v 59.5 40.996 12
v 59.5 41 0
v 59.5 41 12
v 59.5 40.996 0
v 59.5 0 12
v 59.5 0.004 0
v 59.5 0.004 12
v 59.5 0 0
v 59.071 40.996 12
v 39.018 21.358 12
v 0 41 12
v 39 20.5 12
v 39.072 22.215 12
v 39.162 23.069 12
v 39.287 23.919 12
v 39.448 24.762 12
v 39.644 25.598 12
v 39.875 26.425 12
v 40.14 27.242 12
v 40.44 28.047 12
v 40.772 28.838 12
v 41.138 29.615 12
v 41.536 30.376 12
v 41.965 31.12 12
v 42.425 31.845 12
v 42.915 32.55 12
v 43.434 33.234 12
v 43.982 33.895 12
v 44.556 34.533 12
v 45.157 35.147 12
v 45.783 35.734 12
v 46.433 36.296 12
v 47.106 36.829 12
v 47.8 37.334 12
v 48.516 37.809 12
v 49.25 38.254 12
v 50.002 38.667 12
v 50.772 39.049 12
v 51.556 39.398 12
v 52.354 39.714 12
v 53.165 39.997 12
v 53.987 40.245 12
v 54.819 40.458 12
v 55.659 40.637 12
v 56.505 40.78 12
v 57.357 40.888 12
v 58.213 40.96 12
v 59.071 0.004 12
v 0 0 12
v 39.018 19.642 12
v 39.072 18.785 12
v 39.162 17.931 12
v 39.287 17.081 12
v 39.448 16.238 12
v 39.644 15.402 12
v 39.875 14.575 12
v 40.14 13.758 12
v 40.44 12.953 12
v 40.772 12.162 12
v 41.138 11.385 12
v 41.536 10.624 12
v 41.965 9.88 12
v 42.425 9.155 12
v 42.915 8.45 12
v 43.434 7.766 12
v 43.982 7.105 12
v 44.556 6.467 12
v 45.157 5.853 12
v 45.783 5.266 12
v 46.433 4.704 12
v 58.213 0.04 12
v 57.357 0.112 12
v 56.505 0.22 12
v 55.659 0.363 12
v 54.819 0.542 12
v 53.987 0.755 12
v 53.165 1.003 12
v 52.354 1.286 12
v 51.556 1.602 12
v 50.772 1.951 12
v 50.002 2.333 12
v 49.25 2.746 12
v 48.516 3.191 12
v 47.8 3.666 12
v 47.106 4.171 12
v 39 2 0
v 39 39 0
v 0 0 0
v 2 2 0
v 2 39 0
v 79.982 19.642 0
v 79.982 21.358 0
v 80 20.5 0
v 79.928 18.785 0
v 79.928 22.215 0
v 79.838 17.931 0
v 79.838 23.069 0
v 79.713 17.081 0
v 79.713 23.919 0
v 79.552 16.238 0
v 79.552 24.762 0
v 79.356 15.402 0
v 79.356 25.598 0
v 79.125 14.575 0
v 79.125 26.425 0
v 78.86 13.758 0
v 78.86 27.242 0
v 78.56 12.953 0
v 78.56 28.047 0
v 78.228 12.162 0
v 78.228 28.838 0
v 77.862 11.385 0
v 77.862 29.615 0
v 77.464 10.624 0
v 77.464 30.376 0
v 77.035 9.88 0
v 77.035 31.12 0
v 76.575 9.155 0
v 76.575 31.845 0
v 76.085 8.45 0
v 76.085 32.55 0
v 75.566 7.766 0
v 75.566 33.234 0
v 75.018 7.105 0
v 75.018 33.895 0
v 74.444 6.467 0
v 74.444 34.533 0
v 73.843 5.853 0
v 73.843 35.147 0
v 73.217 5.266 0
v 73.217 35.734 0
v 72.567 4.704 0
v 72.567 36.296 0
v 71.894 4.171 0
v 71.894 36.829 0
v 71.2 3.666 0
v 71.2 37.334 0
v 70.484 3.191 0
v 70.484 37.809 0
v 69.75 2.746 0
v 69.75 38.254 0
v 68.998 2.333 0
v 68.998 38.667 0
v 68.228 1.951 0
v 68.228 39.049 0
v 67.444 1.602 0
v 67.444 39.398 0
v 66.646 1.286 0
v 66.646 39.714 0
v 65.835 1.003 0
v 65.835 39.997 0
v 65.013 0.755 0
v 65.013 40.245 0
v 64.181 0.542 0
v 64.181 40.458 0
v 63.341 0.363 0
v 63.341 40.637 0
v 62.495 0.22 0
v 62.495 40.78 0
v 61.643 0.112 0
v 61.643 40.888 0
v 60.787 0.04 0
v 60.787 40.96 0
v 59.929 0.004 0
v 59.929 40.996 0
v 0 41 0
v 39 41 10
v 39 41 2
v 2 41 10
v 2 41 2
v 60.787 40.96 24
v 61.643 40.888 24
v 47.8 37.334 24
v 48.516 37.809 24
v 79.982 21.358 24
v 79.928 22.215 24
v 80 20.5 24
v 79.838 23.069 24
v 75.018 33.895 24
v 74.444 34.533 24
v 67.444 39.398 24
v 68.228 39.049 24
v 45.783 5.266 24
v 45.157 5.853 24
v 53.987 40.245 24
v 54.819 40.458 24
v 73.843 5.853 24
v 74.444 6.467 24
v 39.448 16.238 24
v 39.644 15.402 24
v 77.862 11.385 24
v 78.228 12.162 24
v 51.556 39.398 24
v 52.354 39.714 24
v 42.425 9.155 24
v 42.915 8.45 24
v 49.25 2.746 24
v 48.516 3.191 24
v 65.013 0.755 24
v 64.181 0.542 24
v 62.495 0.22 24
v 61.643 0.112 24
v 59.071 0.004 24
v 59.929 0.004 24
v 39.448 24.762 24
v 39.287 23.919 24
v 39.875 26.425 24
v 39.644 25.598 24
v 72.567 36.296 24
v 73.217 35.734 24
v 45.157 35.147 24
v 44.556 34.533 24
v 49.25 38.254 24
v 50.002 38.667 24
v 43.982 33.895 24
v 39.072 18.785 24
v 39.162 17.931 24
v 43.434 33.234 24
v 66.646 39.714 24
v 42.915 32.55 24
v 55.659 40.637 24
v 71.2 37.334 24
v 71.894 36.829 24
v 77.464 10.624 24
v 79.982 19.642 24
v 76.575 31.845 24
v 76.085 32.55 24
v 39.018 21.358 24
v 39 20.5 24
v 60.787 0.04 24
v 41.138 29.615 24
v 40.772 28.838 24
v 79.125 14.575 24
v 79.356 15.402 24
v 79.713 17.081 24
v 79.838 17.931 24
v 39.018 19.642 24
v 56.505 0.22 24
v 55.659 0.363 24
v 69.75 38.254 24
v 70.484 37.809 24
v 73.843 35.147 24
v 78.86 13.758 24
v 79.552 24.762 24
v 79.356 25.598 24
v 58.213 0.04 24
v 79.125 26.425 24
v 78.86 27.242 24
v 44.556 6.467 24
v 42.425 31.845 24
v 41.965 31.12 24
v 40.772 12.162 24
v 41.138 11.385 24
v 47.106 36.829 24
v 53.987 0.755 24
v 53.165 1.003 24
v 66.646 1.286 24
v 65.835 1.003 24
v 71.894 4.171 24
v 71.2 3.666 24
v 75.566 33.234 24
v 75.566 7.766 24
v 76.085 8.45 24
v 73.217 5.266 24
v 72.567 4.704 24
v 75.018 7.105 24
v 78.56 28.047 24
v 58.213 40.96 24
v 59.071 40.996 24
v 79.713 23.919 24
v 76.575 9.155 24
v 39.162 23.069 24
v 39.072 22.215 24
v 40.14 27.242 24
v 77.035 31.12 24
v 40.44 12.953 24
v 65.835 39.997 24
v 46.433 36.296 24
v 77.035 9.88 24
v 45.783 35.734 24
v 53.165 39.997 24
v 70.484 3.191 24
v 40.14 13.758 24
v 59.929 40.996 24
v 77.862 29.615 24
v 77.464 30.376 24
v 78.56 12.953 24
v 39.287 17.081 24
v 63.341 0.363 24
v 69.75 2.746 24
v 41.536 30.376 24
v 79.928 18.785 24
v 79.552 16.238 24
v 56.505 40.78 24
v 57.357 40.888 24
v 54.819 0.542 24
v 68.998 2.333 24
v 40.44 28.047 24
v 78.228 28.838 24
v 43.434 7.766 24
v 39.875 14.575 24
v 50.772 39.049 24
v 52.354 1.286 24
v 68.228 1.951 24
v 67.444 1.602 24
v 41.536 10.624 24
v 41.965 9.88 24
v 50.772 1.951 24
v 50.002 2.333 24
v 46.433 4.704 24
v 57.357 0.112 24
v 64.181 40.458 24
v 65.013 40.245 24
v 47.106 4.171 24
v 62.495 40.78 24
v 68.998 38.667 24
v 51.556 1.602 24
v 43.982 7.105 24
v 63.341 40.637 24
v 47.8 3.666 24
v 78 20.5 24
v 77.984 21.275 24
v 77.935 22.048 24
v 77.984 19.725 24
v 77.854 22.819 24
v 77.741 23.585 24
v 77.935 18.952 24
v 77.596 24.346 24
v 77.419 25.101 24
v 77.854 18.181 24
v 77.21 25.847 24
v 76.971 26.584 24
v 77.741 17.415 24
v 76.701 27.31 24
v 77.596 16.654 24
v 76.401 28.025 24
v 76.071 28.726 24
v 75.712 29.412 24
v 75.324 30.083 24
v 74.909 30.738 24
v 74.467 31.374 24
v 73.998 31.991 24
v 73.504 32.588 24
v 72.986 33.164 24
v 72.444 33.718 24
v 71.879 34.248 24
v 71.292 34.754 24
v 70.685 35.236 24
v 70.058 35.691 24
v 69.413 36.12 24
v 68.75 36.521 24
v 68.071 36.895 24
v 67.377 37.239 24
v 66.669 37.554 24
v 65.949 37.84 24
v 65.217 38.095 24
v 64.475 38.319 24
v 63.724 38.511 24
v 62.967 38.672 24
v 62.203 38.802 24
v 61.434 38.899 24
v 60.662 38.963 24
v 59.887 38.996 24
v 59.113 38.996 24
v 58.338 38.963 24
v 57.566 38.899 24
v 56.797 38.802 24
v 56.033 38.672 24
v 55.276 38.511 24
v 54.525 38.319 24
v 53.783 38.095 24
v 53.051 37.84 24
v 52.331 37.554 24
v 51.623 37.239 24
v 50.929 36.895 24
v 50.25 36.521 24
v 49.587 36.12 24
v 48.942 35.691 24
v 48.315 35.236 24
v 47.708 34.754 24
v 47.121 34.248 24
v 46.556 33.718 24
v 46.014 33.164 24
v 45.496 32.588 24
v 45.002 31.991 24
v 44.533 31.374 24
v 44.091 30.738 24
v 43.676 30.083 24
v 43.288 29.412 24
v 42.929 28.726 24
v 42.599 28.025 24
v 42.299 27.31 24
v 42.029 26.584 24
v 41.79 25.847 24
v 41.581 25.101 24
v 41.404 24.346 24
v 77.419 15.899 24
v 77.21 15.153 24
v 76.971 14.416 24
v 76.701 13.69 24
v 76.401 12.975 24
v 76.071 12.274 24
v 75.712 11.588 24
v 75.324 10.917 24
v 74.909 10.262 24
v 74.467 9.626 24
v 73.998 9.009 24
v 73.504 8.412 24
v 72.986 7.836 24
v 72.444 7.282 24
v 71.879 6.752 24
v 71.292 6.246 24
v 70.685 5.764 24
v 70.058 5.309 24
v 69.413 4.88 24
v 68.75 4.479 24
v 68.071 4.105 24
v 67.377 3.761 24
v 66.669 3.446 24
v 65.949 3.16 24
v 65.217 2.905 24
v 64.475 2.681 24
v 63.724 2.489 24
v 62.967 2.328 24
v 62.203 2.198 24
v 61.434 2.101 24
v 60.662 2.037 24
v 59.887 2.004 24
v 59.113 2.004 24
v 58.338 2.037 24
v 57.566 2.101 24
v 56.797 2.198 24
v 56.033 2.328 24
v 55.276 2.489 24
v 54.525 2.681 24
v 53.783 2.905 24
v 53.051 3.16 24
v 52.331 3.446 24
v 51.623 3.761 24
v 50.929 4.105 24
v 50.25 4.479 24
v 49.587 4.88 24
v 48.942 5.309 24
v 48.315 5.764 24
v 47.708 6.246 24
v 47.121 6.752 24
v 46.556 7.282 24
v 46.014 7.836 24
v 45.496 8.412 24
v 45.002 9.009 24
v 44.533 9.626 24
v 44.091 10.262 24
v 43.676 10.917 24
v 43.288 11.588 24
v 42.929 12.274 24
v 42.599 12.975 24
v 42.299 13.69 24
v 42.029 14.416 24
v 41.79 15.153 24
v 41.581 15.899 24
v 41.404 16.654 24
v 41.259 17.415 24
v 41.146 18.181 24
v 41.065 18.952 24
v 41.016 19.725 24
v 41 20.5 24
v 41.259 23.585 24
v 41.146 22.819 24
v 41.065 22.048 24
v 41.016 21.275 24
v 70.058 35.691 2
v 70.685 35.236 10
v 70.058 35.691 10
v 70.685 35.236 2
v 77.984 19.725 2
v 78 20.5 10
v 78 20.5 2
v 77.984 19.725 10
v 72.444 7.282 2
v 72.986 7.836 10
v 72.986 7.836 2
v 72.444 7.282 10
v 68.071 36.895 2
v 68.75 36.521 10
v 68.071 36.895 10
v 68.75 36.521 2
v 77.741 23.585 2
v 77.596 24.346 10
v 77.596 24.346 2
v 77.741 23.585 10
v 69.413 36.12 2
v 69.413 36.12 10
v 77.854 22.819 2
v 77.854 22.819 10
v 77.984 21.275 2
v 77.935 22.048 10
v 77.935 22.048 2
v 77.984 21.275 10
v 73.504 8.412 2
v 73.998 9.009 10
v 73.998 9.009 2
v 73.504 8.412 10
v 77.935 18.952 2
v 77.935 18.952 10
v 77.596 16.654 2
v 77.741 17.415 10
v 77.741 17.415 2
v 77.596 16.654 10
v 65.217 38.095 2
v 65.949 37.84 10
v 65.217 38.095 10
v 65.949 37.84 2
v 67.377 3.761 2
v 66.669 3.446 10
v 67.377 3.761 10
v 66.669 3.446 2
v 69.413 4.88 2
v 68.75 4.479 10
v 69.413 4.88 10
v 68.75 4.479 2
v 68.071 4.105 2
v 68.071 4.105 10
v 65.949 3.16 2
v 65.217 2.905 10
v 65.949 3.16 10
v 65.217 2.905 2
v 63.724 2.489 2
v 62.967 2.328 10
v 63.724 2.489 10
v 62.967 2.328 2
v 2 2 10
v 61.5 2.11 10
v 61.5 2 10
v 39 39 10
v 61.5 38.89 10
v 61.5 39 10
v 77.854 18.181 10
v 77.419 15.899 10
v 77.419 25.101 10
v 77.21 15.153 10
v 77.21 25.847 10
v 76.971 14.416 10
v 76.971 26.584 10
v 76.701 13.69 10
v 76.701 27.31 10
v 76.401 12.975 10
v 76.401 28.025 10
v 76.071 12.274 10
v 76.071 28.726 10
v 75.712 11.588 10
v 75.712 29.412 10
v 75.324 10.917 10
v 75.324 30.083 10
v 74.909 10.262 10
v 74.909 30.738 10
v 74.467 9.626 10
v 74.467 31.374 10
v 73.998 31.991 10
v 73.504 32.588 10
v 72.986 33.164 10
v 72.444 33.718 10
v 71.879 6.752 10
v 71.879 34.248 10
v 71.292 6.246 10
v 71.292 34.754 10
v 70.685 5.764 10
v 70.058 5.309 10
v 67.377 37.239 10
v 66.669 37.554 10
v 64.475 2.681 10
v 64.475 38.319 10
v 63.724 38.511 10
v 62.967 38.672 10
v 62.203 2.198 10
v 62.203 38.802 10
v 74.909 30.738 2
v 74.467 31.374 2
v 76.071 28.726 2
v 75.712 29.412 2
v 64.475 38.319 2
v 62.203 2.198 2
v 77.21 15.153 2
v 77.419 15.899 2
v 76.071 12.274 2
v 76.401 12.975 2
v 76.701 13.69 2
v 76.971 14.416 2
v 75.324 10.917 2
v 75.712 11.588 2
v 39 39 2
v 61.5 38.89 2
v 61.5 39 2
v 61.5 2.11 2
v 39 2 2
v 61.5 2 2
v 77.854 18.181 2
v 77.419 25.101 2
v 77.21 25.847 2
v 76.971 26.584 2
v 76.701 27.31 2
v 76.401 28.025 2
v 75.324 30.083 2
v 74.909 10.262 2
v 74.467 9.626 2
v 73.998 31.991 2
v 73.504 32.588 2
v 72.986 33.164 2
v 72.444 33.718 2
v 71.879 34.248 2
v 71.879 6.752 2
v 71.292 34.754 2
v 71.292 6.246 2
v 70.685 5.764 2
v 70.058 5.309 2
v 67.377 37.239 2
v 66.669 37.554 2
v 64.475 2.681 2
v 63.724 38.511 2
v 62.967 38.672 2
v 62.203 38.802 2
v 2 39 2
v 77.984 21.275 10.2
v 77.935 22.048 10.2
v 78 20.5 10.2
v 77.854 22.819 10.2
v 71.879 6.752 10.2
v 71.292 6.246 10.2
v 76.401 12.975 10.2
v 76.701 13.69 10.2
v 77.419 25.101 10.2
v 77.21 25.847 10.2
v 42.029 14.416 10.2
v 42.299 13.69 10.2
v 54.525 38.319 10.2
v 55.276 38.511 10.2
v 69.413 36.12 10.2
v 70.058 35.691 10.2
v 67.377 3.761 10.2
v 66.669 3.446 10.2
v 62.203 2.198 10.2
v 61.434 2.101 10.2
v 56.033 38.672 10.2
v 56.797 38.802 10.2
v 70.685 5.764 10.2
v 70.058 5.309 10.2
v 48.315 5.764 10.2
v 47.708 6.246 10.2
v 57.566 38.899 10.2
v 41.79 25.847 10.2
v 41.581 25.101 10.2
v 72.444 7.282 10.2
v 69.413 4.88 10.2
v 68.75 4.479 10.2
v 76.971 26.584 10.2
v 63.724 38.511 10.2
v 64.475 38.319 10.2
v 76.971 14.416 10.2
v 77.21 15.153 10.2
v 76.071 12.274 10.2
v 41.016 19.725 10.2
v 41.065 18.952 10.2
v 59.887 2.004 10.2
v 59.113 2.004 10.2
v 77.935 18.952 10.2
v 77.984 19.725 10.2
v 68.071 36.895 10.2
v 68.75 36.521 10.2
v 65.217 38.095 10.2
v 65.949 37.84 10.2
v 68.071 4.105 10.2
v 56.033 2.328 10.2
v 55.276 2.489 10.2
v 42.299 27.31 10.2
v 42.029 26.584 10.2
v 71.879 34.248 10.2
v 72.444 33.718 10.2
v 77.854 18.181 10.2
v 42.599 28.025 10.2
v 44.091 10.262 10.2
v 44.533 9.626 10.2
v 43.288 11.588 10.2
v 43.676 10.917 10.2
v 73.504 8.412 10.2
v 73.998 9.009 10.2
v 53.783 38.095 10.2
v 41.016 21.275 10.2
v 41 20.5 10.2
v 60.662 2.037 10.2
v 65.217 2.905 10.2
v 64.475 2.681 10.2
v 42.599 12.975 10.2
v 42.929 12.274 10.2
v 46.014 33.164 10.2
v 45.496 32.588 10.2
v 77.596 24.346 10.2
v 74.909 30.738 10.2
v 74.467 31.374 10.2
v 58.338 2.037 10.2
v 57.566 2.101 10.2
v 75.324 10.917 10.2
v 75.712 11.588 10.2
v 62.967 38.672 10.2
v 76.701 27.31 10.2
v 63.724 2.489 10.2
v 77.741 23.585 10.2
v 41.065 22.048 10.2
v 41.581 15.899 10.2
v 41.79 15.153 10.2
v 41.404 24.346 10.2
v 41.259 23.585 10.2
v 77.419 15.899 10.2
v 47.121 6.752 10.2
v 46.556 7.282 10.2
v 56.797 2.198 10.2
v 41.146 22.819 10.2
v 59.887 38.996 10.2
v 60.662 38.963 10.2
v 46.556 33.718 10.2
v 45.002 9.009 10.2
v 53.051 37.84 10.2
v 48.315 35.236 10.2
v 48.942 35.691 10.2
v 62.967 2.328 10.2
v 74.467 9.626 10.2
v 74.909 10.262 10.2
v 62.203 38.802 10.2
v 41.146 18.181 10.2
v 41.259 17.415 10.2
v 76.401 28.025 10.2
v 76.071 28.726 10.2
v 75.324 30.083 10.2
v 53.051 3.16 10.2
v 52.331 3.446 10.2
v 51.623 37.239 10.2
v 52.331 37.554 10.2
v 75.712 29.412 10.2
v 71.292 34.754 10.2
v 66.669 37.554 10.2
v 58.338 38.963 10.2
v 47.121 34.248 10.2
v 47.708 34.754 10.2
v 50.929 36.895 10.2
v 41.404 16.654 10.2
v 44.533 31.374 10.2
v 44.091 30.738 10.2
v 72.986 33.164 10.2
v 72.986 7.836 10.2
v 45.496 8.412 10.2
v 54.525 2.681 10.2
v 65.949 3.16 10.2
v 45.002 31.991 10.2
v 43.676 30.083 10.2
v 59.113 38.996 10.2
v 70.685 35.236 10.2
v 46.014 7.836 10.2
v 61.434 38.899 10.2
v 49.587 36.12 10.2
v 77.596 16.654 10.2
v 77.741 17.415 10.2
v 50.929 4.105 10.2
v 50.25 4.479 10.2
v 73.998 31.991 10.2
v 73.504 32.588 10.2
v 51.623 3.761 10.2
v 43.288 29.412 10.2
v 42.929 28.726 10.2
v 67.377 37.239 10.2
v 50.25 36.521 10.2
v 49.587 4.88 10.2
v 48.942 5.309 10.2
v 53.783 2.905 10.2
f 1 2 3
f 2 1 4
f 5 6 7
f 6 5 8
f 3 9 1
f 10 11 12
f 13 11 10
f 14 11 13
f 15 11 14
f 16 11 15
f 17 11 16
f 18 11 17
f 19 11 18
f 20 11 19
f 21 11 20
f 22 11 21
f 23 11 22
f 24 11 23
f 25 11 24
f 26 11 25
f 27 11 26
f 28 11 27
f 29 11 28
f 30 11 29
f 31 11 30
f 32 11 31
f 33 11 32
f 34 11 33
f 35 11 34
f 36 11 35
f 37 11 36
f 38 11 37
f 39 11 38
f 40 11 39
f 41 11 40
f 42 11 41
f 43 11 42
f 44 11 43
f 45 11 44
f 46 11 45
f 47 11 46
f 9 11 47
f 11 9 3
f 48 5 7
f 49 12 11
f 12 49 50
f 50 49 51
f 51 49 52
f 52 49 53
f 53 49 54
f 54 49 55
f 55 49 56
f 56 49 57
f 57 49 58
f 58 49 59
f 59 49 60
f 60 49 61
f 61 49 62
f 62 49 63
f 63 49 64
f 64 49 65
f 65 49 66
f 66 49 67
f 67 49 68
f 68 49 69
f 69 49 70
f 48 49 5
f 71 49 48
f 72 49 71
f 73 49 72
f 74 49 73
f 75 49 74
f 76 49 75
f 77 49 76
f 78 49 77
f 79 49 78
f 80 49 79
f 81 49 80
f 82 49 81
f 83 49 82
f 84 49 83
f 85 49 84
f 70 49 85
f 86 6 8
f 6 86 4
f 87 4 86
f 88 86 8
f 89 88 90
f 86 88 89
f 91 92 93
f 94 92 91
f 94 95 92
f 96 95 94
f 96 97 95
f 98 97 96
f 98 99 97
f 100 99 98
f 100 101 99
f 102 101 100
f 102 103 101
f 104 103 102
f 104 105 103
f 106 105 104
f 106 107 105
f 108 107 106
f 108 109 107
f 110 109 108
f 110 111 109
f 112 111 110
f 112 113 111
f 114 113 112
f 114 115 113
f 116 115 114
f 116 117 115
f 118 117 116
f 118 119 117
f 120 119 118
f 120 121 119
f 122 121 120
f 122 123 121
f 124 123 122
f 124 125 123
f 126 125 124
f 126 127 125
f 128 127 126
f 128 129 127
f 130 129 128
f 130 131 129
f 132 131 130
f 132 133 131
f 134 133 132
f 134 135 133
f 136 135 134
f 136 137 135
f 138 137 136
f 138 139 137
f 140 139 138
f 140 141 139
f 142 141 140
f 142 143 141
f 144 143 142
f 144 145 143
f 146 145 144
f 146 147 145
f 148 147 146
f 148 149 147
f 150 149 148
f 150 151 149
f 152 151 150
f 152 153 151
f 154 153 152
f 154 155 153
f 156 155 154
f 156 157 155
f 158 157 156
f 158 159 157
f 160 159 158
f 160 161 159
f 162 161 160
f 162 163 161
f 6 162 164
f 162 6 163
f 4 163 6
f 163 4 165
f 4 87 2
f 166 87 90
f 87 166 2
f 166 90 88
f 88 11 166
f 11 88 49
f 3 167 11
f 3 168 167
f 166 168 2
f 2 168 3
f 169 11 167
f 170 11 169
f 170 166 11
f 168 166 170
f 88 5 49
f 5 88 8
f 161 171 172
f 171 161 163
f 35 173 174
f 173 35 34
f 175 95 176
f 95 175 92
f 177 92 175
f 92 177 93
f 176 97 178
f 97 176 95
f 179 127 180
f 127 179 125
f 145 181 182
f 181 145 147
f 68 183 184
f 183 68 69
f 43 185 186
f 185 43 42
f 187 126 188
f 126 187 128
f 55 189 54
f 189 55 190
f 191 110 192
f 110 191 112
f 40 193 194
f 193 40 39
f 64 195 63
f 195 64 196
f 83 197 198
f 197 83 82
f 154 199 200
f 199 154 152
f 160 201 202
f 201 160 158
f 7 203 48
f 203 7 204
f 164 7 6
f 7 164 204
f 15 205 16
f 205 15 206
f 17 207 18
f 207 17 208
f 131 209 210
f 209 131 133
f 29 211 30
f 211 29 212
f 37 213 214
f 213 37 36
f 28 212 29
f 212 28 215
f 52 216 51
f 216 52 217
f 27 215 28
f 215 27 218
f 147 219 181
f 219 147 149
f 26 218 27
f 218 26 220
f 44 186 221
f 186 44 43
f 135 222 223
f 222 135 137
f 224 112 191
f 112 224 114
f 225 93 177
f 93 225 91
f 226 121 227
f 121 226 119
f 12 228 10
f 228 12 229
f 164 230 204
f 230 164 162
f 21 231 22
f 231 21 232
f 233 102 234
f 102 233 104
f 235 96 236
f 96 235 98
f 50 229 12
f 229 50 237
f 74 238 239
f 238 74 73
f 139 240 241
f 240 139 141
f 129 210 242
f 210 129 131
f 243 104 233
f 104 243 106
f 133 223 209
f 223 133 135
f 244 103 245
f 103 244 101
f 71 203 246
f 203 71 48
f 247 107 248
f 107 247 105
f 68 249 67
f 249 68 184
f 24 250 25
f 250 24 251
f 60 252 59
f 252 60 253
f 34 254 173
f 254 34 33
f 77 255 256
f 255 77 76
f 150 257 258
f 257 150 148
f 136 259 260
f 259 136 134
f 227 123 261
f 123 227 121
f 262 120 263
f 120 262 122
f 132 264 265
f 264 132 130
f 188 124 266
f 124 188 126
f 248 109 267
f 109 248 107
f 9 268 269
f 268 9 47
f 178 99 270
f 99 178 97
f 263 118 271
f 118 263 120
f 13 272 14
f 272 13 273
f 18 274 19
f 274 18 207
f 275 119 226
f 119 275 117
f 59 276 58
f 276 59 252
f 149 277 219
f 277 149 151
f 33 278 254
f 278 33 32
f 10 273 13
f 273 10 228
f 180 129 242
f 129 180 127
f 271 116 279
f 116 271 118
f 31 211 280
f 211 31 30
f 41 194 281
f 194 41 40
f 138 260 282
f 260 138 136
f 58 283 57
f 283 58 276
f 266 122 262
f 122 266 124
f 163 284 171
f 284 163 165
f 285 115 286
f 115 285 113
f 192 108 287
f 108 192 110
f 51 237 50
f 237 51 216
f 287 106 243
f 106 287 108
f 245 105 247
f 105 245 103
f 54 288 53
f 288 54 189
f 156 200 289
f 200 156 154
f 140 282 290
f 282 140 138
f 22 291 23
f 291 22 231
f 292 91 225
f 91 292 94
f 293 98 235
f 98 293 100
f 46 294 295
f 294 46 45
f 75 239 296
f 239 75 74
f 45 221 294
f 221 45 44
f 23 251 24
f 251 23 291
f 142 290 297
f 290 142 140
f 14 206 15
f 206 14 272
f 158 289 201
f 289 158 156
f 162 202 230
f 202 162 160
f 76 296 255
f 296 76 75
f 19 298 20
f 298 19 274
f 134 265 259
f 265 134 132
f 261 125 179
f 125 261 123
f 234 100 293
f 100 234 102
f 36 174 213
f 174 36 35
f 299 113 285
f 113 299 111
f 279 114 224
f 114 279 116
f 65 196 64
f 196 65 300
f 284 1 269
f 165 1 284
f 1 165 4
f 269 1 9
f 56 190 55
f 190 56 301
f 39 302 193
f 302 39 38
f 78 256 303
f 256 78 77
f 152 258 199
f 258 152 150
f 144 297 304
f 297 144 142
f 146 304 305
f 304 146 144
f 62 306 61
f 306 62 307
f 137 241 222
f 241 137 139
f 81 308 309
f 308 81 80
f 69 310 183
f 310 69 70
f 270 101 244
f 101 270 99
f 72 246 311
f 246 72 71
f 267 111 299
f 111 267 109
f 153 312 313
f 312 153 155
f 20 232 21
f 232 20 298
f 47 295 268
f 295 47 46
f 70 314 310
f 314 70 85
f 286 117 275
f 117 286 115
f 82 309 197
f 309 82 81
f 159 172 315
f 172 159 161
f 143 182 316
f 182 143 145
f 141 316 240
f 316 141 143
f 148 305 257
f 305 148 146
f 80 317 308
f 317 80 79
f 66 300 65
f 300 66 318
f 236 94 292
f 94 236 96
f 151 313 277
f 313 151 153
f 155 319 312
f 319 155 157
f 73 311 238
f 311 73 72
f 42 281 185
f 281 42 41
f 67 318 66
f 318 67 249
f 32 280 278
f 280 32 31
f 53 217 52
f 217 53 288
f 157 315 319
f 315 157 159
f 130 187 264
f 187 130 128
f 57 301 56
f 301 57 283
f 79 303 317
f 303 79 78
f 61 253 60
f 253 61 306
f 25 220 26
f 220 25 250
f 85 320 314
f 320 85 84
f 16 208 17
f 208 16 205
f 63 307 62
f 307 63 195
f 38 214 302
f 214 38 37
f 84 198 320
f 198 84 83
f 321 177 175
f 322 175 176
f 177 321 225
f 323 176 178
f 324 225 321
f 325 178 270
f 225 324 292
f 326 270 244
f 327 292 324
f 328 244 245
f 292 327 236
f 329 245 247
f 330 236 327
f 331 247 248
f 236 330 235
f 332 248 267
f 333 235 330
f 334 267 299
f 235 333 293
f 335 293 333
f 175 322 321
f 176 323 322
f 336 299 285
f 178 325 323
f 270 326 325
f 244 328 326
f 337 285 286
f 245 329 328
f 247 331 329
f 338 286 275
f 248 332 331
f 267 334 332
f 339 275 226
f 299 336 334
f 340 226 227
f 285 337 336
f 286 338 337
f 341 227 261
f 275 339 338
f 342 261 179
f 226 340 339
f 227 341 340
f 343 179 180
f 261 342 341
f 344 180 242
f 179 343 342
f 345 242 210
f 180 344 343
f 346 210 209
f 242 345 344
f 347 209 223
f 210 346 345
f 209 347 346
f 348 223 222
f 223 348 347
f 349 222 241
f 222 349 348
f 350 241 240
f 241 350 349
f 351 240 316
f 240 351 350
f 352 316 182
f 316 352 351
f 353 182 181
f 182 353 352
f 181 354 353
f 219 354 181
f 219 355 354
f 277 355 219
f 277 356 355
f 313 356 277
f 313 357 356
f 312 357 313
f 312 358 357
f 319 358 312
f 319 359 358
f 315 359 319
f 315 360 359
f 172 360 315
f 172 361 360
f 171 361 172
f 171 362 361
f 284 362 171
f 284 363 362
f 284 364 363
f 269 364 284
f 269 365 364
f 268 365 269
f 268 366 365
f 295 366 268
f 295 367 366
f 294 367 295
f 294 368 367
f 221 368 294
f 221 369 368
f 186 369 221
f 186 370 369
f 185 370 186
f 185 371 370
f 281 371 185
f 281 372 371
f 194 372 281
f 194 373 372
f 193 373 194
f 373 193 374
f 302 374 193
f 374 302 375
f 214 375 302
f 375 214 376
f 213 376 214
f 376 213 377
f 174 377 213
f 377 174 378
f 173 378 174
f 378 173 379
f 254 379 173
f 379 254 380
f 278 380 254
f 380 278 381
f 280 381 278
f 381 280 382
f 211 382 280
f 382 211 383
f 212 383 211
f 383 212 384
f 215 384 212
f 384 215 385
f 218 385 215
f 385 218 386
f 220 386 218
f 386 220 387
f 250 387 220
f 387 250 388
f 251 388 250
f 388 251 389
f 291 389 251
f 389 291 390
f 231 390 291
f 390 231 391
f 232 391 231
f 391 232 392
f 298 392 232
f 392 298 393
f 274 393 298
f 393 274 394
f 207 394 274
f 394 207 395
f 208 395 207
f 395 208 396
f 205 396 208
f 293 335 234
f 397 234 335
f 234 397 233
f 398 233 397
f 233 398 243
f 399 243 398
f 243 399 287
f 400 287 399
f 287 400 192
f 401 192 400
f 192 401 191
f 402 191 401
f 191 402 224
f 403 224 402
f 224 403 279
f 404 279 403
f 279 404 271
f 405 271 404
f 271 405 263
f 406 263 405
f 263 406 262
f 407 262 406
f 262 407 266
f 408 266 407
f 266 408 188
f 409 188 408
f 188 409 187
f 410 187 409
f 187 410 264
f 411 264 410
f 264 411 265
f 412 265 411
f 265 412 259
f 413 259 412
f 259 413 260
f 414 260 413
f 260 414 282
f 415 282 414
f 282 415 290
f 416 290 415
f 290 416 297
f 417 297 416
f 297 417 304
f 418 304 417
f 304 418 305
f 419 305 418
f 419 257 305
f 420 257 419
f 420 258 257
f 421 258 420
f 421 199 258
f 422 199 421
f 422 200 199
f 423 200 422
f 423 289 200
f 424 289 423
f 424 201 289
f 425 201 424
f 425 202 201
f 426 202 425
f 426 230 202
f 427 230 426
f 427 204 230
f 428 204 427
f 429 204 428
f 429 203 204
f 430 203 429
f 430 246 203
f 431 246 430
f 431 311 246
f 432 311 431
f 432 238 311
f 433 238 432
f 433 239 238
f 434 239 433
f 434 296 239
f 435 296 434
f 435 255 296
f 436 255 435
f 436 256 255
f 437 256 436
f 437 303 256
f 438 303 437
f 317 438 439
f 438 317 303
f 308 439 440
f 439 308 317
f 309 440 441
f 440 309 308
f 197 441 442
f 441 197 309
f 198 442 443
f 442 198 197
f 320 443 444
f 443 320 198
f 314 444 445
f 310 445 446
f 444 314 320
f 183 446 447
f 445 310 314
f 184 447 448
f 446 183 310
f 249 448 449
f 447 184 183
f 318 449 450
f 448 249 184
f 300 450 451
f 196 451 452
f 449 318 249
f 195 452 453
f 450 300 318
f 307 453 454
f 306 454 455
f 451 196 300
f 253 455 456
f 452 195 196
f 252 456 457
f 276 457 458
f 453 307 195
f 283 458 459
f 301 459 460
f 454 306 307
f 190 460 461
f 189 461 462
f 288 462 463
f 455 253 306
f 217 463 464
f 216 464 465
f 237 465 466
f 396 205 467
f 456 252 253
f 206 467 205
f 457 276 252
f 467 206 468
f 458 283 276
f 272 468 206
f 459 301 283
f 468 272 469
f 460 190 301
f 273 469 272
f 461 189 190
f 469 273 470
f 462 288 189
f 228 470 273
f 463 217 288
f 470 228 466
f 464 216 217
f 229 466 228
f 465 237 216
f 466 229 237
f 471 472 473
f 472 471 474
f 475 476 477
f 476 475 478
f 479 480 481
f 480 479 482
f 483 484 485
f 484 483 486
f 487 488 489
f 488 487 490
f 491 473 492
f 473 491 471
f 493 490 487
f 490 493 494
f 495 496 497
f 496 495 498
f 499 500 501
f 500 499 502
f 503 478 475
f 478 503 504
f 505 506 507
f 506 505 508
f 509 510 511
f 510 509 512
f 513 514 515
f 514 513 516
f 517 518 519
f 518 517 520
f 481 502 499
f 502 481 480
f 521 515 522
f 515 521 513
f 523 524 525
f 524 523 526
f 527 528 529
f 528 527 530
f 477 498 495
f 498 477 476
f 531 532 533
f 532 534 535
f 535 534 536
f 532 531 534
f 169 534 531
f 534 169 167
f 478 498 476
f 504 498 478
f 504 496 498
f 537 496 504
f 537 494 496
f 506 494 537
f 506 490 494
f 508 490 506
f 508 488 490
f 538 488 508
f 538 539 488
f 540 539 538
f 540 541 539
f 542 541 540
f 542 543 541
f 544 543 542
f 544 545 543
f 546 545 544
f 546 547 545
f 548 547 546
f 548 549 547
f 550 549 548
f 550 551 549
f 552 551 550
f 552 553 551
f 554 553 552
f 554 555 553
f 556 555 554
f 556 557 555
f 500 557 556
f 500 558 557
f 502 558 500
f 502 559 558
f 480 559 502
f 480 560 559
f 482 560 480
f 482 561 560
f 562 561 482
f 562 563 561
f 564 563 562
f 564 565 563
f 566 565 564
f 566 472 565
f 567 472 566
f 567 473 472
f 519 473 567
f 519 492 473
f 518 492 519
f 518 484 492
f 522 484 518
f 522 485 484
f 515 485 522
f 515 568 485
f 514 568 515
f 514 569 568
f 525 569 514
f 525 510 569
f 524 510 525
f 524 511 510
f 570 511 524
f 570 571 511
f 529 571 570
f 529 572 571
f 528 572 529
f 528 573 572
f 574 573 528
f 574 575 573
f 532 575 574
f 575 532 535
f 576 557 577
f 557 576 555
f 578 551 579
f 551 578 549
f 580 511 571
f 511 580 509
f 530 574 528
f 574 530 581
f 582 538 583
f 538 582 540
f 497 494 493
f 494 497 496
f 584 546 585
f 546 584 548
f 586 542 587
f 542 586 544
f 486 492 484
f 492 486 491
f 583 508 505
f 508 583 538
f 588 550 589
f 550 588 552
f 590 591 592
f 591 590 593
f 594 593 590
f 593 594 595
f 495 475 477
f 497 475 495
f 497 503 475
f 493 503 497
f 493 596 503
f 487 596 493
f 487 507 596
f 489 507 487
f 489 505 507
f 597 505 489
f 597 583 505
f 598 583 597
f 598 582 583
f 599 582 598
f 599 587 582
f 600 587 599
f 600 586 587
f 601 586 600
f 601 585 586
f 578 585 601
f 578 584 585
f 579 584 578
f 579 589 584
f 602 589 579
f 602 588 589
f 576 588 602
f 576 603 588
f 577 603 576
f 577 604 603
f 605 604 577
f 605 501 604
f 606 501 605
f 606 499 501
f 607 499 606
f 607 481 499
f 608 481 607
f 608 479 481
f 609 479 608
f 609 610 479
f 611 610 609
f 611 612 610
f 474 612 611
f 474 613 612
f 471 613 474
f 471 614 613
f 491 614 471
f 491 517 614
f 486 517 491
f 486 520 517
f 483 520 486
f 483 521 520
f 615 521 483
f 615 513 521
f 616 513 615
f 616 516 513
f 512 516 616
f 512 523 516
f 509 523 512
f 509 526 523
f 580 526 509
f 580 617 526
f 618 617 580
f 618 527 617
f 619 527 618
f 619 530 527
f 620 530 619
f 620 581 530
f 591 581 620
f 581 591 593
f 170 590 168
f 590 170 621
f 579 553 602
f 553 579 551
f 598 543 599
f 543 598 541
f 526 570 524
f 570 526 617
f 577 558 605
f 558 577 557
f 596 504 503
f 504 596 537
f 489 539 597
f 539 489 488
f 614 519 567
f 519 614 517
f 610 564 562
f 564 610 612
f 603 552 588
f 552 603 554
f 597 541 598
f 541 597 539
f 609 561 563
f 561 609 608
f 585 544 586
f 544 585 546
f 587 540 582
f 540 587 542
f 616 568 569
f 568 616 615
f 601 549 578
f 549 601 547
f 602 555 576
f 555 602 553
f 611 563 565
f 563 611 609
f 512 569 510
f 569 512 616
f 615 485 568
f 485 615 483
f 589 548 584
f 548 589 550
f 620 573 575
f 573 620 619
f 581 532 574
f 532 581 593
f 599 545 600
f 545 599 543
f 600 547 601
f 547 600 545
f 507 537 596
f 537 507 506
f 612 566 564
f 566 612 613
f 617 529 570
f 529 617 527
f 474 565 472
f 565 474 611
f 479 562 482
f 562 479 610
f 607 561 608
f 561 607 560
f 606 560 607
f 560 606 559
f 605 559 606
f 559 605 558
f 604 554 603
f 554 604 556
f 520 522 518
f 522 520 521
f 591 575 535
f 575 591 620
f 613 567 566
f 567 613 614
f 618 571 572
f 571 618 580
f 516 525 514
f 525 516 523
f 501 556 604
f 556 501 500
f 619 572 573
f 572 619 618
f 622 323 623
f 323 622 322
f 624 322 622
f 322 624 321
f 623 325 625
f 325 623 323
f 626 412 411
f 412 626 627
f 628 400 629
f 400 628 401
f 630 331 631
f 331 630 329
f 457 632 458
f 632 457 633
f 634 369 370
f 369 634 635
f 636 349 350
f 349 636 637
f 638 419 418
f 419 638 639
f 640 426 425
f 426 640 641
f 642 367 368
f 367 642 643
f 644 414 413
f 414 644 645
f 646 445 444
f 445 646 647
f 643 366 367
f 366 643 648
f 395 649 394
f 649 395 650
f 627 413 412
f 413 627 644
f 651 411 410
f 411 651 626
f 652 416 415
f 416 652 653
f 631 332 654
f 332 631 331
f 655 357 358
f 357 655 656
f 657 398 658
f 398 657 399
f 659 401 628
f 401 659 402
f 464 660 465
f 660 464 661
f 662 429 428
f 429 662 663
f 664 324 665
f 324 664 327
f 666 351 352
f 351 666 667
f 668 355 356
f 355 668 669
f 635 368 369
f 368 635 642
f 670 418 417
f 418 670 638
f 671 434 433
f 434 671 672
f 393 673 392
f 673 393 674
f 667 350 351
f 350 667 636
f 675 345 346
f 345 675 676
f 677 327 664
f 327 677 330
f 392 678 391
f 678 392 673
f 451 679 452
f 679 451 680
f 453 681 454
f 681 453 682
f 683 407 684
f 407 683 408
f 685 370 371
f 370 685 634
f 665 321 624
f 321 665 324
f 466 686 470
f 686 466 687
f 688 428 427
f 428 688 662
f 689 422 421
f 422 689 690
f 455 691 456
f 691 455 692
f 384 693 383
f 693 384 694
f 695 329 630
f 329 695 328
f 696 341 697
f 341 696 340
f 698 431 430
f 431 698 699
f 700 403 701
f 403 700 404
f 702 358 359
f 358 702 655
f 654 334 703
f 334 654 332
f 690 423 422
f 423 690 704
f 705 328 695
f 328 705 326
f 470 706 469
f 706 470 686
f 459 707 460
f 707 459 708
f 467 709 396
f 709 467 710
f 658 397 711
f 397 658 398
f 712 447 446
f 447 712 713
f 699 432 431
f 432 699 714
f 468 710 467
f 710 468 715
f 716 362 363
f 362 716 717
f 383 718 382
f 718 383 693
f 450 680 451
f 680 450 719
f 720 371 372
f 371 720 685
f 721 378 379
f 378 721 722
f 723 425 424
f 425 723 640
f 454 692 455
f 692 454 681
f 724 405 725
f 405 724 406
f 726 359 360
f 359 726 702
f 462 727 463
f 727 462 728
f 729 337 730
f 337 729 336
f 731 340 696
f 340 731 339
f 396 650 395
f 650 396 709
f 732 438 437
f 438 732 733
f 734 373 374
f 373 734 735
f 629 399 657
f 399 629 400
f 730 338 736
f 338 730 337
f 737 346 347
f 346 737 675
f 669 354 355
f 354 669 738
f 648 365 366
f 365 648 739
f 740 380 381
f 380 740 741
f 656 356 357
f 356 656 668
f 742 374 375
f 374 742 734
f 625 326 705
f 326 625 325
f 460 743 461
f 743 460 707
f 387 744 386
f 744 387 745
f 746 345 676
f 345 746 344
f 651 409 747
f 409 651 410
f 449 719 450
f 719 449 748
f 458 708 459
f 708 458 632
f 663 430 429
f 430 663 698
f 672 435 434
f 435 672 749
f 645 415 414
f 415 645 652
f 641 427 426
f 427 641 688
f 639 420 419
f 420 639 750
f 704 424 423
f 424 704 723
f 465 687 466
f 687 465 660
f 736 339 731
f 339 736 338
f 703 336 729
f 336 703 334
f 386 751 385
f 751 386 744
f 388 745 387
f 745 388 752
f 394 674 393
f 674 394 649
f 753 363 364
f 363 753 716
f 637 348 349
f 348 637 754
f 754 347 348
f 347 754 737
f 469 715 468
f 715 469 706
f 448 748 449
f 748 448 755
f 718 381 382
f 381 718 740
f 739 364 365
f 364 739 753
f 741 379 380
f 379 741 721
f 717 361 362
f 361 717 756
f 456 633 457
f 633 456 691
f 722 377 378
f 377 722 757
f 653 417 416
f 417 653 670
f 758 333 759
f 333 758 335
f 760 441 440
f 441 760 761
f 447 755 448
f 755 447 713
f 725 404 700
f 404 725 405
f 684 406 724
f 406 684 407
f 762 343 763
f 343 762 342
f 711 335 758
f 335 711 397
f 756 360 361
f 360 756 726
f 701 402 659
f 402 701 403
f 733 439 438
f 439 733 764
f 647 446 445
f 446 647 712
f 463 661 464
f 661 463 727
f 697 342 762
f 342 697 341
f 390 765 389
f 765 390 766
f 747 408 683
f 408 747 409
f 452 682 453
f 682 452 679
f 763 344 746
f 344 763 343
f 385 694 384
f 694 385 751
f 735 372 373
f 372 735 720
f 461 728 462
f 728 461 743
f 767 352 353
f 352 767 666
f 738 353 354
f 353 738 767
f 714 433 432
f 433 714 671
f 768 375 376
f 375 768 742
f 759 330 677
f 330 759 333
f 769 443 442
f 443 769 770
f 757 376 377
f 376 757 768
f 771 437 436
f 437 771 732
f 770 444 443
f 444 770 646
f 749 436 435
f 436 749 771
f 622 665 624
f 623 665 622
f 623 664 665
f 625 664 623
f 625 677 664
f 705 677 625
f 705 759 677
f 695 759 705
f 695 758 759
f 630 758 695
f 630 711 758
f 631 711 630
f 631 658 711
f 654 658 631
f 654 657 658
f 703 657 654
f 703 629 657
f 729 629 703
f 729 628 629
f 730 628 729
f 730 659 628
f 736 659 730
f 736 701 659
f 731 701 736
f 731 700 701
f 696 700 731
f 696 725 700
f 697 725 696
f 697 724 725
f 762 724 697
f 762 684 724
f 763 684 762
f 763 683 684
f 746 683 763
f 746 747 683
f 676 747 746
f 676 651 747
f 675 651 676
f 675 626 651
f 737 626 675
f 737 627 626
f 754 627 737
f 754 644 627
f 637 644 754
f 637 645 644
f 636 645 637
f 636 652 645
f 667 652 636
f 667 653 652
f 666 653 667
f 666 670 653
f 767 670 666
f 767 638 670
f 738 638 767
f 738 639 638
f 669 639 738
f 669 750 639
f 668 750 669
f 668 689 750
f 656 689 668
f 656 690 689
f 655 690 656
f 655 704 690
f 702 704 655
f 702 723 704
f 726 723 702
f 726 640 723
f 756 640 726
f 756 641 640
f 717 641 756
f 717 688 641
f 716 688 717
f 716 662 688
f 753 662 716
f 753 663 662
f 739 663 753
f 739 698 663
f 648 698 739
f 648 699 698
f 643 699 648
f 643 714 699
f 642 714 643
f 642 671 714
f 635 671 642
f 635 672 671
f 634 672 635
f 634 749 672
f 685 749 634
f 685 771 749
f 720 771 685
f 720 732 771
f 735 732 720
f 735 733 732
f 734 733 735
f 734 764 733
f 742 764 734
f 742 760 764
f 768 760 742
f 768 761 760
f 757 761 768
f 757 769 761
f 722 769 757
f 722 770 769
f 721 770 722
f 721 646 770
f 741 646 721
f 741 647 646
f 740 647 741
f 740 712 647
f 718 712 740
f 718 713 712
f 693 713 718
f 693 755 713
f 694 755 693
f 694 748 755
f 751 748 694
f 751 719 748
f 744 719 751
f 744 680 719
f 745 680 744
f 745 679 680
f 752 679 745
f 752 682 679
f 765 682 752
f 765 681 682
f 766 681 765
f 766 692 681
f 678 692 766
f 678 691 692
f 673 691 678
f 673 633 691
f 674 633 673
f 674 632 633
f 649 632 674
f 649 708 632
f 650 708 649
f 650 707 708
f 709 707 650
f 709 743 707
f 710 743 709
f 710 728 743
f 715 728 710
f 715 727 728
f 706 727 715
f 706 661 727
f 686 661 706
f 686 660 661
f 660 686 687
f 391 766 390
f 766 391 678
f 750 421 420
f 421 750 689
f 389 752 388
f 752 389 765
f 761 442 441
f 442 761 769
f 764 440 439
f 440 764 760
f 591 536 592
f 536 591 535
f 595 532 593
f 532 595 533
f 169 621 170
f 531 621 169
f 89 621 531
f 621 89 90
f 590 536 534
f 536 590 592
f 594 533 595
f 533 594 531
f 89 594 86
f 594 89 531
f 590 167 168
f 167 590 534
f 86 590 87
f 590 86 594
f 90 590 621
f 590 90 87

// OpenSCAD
$fn=150;
extra=0.01;
layerHeigth=0.2;

fanXY=80;
fanZ=18;

cutoutHoleDia=37; /* set diameter of necessaty blowout hole */
cutoutHoleR=cutoutHoleDia/2;
cutoutTubeLen=30;
wallThickness=2;

screwR=1.95;
screwDistance=71.4;
fanHole=76;
frontPlateThickness=4;

module mountingScrewHoles()
{
  cylinder(r=screwR, h=frontPlateThickness, center=false);
  translate([screwDistance,0,0]) cylinder(r=screwR, h=frontPlateThickness, center=false);
  translate([0,screwDistance,0]) cylinder(r=screwR, h=frontPlateThickness, center=false);
  translate([screwDistance,screwDistance,0]) cylinder(r=screwR, h=frontPlateThickness, center=false);
}

/* translate([(fanXY-screwDistance)/2,(fanXY-screwDistance)/2,0])
mountingScrewHoles(); */

module fanMountingPlate()
{
  difference() {
    cube([fanXY,fanXY,frontPlateThickness]);

    translate([fanXY/2,fanXY/2,0])
      cylinder(r=fanHole/2, h=frontPlateThickness, center=false);

    translate([(fanXY-screwDistance)/2,(fanXY-screwDistance)/2,0])
      mountingScrewHoles();
  }
}

/* fanMountingPlate(); */


module fanOut()
{

  difference() {
    union()
    {
      fanMountingPlate();
      difference() {
        hull()
        {
          cube([fanXY,fanXY,fanZ]);
          translate([fanXY/2,0,cutoutHoleR]) rotate([-90,0,0]) cylinder(r=cutoutHoleR,h=fanXY);
        }
        hull()
        {
          translate([wallThickness,wallThickness,0]) cube([fanXY-wallThickness*2,fanXY-wallThickness*2,fanZ]);
          translate([fanXY/2,wallThickness,cutoutHoleR]) rotate([-90,0,0]) cylinder(r=cutoutHoleR-wallThickness/2,h=fanXY-wallThickness*2);
        }
      }
      translate([fanXY/2,-cutoutTubeLen,cutoutHoleR]) rotate([-90,0,0]) cylinder(r=cutoutHoleR,h=cutoutTubeLen);
    }
    translate([fanXY/2,-cutoutTubeLen,cutoutHoleR]) rotate([-90,0,0]) cylinder(r=cutoutHoleR-wallThickness,h=cutoutTubeLen+wallThickness-layerHeigth);
  }
}

/* fanOut(); */


module filterEdge()
{
/* translate([0,0,0])  cylinder(r=cutoutHoleR,h=10); */
  difference()
  {
    union()
    {
      cube([cutoutHoleR*3+wallThickness*2,cutoutHoleR*2+wallThickness*2,10+wallThickness]);
      translate([cutoutHoleR*3+wallThickness*2,cutoutHoleR+wallThickness,0])
        cylinder(r=cutoutHoleR+wallThickness,h=wallThickness*2+20);

      hull()
      {
        translate([0,cutoutHoleR*2+wallThickness*2,0])
        cube([cutoutHoleR*2+wallThickness*2,1,10+wallThickness]);

        translate([cutoutHoleR+wallThickness,80,cutoutHoleR+wallThickness+1])
          rotate([-90,0,0])
          cylinder(r=cutoutHoleR+wallThickness,h=1);
      }

      translate([cutoutHoleR+wallThickness,80,cutoutHoleR+wallThickness+1])
        rotate([-90,0,0])
        cylinder(r=cutoutHoleR+wallThickness,h=20);
    }

    translate([0,cutoutHoleR*2+wallThickness*2,-2])
    cube([50,100,2]);

    translate([cutoutHoleR*3+wallThickness*2,cutoutHoleR+wallThickness,wallThickness])
      cylinder(r=cutoutHoleR,h=10-wallThickness);

    translate([cutoutHoleR*3+wallThickness*2,cutoutHoleR+wallThickness,10+0.2])
      cylinder(r=cutoutHoleR,h=10+wallThickness*2);

    translate([wallThickness,wallThickness,wallThickness]) cube([cutoutHoleR*3+wallThickness*2,cutoutHoleR*2,10-wallThickness]);

    translate([wallThickness,cutoutHoleR*2,wallThickness])
    cube([cutoutHoleR*2,wallThickness*2+extra,10-wallThickness]);

    hull()
    {
      translate([wallThickness,cutoutHoleR*2+wallThickness*2,wallThickness])
      cube([cutoutHoleR*2,1,10-wallThickness]);

      translate([cutoutHoleR+wallThickness,80,cutoutHoleR+wallThickness+1])
        rotate([-90,0,0])
        cylinder(r=cutoutHoleR,h=1);
    }

    translate([cutoutHoleR+wallThickness,80,cutoutHoleR+wallThickness+1])
      rotate([-90,0,0])
      cylinder(r=cutoutHoleR,h=20+extra);


    translate([wallThickness,wallThickness,-extra])
      cube([cutoutHoleR*2,cutoutHoleR*2,wallThickness+extra*2]);
  }
}


/* difference()
{
  filterEdge();
  translate([0,0,0])
  cube([100,cutoutHoleR*2+wallThickness*2,40]);
} */

difference()
{
  filterEdge();
  translate([0,cutoutHoleR*2+wallThickness*2,0])
  cube([100,cutoutHoleR*2+wallThickness*2+21,50]);
}


module filterCardridge()
{
  difference()
  {
    union()
    {
      cube([cutoutHoleR*2+wallThickness*2,cutoutHoleR*2+wallThickness*2,wallThickness]);
      translate([wallThickness+extra,wallThickness+extra,0]) cube([cutoutHoleR*2-extra*2,cutoutHoleR*2-extra*2,10]);
    }
    translate([wallThickness*2,wallThickness*2,wallThickness]) cube([cutoutHoleR*2-wallThickness*2,cutoutHoleR*2-wallThickness*2,10]);

    hull()
    {
      translate([wallThickness,wallThickness*2-1,10-1]) cube([cutoutHoleR*2-wallThickness+extra*2,cutoutHoleR*2-wallThickness*2+2,0.1]);
      translate([wallThickness,wallThickness*2,10-0.1]) cube([cutoutHoleR*2-wallThickness+extra*2,cutoutHoleR*2-wallThickness*2,0.1]);
    }

    for(i=[0:8])
    {
      translate([0,3.85*i,0])
      translate([wallThickness*2,wallThickness*2,wallThickness])
        cube([cutoutHoleR*2,2,7]);
    }

    for(i=[0:8])
    {
      translate([3.85*i,0,0])
      translate([wallThickness*2,wallThickness,wallThickness])
        cube([2,cutoutHoleR*2,6]);
    }
  }
}

/* translate([0,0,-16])
filterCardridge(); */


module cardridgeTopSlide()
{
  /* closeing plate for cardridge */
  hull()
  {
    translate([wallThickness,wallThickness*2-1,10-1]) cube([cutoutHoleR*2-wallThickness,cutoutHoleR*2-wallThickness*2+2-0.4,0.1]);
    translate([wallThickness,wallThickness*2,10-0.1]) cube([cutoutHoleR*2-wallThickness,cutoutHoleR*2-wallThickness*2-0.4,0.1]);
  }
}
/* cardridgeTopSlide(); */
